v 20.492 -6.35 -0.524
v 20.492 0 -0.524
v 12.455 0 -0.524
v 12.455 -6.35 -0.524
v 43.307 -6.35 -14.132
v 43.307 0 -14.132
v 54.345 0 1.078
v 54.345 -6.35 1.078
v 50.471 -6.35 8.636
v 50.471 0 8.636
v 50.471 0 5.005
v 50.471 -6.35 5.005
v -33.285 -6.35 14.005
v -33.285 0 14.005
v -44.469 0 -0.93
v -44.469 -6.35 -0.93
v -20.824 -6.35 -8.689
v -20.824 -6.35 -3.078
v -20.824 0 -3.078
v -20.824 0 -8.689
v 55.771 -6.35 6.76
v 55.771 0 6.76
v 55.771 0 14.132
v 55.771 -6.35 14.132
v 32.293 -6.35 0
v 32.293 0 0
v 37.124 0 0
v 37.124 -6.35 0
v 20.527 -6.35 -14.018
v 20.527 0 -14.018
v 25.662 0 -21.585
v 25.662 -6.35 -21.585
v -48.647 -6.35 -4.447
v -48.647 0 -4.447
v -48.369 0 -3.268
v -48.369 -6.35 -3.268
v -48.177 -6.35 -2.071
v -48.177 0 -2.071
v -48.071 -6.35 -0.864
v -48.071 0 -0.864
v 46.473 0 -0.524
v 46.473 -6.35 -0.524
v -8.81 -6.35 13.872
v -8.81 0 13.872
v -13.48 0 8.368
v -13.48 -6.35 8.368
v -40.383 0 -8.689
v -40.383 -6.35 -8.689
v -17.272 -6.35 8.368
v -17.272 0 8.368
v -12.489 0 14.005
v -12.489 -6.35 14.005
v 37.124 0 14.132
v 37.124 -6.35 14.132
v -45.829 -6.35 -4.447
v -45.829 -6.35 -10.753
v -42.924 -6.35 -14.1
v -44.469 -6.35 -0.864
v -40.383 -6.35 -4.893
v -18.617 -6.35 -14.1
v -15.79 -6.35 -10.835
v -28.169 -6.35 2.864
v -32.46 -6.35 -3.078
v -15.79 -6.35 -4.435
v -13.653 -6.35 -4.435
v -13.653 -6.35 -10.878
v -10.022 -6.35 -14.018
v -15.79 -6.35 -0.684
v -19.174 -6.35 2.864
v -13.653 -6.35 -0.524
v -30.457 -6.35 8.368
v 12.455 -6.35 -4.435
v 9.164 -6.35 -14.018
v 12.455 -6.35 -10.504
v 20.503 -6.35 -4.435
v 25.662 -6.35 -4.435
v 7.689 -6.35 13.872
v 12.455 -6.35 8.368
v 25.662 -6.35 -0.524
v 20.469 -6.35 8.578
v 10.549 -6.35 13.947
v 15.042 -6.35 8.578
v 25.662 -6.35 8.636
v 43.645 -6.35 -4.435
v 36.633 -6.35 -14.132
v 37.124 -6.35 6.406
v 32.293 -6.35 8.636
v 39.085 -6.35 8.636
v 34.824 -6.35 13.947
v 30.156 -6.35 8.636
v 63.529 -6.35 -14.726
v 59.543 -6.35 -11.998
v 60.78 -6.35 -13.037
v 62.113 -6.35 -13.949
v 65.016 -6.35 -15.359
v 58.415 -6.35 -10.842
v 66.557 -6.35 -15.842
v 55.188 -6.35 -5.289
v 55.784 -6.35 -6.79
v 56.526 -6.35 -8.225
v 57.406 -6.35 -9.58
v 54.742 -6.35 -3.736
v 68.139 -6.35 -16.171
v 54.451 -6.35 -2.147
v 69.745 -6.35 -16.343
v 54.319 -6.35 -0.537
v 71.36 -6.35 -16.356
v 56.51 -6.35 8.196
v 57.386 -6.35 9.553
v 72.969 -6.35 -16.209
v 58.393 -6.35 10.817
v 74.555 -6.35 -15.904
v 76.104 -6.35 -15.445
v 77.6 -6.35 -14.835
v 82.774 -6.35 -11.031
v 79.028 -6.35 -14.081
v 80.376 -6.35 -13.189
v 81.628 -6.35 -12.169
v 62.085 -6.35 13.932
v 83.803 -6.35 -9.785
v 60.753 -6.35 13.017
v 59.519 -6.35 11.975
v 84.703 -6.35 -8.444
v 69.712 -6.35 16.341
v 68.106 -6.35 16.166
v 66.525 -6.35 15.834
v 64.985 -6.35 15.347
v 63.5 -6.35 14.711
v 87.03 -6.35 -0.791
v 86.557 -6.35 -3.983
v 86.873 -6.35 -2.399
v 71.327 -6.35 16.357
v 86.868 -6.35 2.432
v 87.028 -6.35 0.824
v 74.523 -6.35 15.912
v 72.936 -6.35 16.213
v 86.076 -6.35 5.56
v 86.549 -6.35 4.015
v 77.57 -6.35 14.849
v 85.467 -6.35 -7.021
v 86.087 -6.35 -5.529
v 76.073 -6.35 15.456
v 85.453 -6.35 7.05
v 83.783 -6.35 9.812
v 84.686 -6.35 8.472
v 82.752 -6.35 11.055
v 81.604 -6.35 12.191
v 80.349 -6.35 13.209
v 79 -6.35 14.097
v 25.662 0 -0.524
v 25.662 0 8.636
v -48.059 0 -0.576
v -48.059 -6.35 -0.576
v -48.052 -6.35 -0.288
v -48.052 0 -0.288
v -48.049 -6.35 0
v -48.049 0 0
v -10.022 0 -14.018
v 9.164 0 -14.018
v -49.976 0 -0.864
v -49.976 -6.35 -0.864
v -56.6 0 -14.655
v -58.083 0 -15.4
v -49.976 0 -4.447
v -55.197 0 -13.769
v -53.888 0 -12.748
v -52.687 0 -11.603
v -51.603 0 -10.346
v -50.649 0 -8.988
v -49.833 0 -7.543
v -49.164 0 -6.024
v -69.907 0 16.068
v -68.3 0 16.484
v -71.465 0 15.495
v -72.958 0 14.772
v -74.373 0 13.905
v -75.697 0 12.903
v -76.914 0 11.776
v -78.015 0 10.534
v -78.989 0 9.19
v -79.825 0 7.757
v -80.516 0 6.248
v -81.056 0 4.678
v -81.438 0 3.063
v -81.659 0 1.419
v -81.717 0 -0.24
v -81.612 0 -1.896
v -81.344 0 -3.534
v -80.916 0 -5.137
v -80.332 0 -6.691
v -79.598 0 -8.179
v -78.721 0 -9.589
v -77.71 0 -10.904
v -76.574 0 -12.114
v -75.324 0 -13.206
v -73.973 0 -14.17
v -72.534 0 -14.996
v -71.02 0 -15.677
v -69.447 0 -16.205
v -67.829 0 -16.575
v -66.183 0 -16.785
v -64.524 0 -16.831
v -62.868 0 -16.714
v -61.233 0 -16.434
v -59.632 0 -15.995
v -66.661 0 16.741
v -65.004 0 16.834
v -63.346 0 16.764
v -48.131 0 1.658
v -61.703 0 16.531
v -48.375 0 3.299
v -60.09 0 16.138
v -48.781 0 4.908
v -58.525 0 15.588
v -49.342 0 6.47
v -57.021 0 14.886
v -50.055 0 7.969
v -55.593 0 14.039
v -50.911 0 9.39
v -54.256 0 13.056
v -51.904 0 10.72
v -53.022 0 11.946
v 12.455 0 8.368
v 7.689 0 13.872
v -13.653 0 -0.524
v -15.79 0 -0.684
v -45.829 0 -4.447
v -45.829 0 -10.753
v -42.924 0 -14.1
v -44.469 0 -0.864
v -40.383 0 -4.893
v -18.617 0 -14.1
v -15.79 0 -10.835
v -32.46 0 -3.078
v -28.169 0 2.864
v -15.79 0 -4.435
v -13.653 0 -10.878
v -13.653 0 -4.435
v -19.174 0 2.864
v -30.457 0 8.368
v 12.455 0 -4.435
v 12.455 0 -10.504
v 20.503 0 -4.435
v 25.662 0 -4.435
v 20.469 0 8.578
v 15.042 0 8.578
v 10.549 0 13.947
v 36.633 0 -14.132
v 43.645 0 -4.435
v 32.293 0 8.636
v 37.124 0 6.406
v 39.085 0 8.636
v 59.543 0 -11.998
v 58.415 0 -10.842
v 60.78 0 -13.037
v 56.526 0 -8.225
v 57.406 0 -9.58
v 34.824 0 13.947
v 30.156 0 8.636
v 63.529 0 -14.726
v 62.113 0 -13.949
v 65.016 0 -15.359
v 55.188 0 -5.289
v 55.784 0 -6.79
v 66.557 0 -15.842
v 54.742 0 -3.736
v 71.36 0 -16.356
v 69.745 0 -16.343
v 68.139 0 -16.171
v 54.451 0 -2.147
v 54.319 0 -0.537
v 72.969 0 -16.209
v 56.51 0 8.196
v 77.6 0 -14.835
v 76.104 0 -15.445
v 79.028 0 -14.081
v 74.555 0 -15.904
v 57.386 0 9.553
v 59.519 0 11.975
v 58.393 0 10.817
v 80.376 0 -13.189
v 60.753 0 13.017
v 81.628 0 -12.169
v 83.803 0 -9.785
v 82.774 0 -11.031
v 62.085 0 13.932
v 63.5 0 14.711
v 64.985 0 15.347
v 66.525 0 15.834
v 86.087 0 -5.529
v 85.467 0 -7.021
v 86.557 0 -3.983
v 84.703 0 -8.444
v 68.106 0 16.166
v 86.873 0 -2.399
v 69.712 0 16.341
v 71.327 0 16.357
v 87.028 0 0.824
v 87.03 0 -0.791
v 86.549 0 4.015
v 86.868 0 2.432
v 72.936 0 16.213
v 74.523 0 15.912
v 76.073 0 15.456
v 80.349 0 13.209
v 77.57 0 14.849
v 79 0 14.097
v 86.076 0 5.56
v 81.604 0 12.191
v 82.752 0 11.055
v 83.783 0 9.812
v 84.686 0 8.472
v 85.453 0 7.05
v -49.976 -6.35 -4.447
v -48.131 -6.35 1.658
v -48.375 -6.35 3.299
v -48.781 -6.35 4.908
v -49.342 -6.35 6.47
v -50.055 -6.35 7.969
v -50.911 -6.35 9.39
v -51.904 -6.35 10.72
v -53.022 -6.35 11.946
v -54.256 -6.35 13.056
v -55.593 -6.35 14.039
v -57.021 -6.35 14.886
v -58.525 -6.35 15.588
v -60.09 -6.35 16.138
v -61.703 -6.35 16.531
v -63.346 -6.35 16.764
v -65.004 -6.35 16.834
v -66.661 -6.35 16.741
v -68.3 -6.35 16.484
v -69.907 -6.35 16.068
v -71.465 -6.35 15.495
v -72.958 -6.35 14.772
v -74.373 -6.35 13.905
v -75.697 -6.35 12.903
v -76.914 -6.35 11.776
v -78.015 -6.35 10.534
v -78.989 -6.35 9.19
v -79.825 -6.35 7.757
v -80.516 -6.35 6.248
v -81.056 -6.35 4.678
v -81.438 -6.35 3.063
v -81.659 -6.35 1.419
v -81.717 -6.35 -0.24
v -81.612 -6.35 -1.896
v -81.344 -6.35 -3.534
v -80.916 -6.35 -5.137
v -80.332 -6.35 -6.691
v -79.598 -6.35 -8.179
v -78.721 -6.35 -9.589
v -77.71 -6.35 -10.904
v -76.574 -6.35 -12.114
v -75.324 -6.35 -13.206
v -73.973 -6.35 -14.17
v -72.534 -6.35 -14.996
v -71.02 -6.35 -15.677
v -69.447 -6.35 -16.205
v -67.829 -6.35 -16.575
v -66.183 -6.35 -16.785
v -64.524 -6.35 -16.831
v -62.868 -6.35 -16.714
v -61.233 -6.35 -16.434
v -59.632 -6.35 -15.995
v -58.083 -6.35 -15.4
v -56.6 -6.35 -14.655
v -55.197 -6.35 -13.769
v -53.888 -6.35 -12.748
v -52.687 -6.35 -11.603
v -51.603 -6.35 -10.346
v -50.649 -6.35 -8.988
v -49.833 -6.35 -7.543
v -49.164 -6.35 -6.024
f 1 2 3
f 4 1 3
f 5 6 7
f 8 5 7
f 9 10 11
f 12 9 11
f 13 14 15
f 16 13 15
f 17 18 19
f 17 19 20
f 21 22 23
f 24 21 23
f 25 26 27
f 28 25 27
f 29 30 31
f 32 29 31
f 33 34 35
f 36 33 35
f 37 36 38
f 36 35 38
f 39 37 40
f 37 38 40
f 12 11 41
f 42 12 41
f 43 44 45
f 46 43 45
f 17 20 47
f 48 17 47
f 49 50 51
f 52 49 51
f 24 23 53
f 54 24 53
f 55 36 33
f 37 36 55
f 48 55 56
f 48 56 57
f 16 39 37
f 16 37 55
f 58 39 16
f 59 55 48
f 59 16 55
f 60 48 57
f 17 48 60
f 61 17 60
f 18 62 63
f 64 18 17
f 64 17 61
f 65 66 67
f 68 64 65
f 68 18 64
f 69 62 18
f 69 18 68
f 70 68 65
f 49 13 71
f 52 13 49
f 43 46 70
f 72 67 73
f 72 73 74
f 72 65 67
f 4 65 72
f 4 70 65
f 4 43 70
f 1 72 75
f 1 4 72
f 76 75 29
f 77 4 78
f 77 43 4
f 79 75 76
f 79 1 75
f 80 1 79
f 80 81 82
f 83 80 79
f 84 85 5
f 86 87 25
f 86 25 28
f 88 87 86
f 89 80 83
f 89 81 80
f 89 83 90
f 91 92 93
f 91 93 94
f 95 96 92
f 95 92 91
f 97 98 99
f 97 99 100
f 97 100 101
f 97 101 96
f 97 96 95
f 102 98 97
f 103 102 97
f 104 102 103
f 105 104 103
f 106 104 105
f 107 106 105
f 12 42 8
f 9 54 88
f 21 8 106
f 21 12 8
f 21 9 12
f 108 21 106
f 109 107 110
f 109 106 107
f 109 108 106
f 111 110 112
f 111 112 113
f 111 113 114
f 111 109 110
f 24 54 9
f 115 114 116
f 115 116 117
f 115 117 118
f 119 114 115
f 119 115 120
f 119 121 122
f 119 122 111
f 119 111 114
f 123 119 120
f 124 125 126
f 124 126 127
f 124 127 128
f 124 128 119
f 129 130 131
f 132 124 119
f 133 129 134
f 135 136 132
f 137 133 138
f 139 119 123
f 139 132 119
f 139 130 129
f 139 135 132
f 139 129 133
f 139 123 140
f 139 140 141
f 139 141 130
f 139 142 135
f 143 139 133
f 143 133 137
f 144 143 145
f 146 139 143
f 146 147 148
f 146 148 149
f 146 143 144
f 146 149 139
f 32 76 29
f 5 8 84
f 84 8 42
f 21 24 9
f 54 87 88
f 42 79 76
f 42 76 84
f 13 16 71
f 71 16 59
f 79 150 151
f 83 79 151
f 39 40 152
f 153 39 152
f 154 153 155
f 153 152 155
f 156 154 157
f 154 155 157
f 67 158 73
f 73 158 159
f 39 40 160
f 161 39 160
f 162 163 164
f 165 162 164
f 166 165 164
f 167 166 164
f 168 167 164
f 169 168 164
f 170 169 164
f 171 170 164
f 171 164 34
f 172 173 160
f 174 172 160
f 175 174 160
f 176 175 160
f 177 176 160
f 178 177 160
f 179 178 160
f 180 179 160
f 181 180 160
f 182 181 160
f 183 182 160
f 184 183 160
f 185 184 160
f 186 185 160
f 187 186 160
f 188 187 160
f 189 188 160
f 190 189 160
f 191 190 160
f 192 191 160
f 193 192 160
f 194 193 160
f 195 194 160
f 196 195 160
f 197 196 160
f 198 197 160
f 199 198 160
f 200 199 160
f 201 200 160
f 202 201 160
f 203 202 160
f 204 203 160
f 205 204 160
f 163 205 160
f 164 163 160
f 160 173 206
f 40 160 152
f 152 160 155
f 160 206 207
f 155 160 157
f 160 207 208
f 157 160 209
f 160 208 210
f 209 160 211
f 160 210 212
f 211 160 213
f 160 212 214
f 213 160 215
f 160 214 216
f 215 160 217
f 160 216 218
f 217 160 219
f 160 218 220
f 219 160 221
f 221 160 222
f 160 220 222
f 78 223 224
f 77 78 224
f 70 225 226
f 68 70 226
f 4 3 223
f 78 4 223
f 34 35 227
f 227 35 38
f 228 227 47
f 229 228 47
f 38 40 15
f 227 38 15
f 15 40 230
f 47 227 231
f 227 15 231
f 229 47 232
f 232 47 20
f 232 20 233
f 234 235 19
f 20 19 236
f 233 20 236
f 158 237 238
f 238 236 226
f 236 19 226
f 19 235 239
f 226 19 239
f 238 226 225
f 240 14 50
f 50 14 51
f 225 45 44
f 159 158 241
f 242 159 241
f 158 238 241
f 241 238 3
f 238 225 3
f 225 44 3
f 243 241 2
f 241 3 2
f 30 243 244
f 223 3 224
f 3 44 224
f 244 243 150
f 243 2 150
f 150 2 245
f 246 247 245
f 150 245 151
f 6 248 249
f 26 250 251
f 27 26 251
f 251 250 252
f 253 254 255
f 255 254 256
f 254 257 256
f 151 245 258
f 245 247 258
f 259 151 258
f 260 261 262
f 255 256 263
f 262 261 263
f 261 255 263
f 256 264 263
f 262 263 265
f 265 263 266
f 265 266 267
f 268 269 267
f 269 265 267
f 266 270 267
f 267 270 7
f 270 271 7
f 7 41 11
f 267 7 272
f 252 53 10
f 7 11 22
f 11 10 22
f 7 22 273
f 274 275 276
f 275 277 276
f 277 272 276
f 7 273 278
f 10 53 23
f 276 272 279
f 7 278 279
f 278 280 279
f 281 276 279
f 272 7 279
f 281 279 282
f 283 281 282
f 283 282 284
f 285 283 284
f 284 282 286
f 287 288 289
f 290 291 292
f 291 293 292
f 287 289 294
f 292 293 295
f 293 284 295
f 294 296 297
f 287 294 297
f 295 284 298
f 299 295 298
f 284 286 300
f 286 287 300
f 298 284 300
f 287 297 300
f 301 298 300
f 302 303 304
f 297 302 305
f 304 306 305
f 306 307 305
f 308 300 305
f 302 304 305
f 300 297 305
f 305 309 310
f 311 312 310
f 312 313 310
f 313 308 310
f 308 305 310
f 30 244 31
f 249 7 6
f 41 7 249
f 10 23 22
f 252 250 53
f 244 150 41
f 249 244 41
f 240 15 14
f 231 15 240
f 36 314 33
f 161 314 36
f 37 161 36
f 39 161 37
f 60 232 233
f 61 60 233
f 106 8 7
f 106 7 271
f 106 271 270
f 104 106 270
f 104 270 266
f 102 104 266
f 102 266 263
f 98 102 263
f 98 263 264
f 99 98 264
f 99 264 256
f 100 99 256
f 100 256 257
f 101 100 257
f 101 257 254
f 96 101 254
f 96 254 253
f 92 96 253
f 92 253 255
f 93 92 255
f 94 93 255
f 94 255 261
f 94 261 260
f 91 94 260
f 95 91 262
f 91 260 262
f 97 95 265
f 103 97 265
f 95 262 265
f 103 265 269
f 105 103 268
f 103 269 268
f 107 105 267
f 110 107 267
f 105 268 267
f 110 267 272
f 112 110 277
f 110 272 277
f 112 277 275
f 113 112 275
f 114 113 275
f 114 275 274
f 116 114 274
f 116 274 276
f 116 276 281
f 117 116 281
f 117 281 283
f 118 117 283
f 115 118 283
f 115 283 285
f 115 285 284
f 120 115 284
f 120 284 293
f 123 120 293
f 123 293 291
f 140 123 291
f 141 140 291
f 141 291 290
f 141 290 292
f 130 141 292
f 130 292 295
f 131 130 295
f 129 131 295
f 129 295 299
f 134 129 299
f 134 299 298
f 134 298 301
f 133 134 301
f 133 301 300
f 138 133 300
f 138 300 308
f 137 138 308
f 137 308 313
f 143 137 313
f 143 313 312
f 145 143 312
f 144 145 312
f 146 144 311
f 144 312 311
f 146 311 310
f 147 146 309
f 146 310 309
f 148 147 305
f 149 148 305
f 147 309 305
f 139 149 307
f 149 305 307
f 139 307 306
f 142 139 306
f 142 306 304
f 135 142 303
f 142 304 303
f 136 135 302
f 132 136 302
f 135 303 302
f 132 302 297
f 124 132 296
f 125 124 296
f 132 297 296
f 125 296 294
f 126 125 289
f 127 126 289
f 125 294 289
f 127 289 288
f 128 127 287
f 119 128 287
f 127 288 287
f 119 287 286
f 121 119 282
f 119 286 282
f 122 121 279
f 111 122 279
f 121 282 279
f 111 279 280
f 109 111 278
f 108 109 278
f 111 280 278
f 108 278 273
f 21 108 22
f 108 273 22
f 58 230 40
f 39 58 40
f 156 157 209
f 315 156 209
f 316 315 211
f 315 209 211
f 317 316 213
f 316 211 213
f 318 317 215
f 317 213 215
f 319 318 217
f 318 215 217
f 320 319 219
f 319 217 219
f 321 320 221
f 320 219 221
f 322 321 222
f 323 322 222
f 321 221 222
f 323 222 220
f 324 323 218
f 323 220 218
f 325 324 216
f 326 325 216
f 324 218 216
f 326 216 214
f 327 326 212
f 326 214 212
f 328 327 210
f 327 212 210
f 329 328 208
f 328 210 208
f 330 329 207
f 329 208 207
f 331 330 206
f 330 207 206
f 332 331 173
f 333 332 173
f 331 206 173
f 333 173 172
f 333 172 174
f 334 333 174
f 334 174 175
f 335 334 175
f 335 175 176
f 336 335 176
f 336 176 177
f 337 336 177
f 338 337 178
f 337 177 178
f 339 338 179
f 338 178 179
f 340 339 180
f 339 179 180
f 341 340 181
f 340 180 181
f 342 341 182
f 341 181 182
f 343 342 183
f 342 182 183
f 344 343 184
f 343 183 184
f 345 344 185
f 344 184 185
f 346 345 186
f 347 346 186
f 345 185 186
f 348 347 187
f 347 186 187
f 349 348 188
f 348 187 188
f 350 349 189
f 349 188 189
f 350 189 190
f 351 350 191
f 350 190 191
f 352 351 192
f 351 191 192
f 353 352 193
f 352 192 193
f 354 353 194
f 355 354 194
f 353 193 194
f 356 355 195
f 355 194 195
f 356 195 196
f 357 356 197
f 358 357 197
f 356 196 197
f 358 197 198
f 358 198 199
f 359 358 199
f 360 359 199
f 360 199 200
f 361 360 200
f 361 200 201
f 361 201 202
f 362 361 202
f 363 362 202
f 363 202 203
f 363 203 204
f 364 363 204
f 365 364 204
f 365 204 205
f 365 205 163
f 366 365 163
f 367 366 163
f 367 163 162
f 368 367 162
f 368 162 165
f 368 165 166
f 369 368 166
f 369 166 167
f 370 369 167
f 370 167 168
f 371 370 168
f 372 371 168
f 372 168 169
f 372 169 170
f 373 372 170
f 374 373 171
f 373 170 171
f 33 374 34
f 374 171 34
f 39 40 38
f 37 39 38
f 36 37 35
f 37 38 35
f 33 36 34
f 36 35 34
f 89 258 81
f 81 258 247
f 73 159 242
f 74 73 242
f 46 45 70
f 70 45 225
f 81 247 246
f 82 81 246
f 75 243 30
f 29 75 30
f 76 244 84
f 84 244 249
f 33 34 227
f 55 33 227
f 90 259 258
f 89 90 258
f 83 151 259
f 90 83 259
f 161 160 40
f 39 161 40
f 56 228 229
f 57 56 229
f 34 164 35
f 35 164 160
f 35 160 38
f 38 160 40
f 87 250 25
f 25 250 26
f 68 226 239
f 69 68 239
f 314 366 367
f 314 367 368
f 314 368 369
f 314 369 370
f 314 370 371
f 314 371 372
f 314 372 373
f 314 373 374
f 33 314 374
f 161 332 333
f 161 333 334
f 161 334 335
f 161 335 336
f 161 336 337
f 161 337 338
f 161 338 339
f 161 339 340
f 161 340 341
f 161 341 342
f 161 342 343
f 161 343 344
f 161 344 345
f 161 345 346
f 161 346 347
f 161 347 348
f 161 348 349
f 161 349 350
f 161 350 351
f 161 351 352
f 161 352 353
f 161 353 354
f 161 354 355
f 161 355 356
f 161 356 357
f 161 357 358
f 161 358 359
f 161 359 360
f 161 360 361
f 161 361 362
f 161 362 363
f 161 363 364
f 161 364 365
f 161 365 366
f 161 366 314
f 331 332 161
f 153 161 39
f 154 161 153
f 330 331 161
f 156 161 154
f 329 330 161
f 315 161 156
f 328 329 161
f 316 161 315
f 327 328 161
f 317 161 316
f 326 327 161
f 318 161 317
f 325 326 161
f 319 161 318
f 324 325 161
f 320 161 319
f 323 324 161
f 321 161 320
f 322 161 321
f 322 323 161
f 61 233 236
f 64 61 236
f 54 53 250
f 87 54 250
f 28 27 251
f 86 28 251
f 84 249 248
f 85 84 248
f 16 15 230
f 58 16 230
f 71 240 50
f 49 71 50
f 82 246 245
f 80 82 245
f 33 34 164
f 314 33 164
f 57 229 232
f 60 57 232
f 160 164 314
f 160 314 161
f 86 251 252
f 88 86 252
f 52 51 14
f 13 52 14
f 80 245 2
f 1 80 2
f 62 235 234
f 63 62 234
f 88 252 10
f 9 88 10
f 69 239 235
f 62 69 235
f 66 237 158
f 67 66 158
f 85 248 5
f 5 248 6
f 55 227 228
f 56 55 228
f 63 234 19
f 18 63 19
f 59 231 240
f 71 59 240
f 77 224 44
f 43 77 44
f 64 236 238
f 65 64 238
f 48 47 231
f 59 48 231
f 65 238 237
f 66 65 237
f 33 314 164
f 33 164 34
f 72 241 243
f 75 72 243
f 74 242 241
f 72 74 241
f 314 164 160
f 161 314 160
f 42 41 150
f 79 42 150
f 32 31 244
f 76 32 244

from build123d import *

# Parameters (mm, degrees)
F0_W     = 26.1089192261
F0_H     = 3.9108566001
F1_DEPTH = 6.35
F3_DEPTH = 6.35
F2_R     = 16.3697658046
F2_W     = 1.3287387717
F2_H     = 3.5829652334
F4_DEPTH = 6.35


with BuildPart() as f1:
    # F0 (on Front) → F1 (new body)
    with BuildSketch(Plane.XZ):
        Polygon((-17.2716648454, 8.3683752126), (-12.4890261563, 14.0050568812), (-33.2854723321, 14.0050568812), (-45.8293622946, -2.7476381483), (-45.8293622946, -10.7526200239), (-42.924048809, -14.0997227066), (-18.6173166222, -14.0997227066), (-15.7900494681, -10.8351450901), (-15.7900494681, -4.4349345413), (-15.7900494681, -0.6844981479), (-19.1735985349, 2.8641023428), (-28.1688865431, 2.8641023428), (-32.4602175373, -3.0777403073), (-20.8241108796, -3.0777403073), (-20.8241108796, -8.689479593), (-40.3826734857, -8.689479593), (-40.3826734857, -4.8933031288), (-30.4567566351, 8.3683752126), align=None)
        Polygon((-15.7900494681, -0.6844981479), (-15.7900494681, -4.4349345413), (-13.6534879907, -4.4349345413), (-13.6534879907, -0.5240779412), align=None)
        Polygon((-13.4795079801, 8.3683752126), (-13.6534879907, -0.5240779412), (12.4554312354, -0.5240779412), (12.4554312354, 8.3683752126), (7.6892861493, 13.8719277541), (-8.8098273311, 13.8719277541), align=None)
        Polygon((12.4554312354, -4.4349345413), (-13.6534879907, -4.4349345413), (-13.6534879907, -10.8778495407), (-10.0223072469, -14.0183292718), (9.1640663944, -14.0183292718), (12.4554312354, -10.5037926609), align=None)
        with Locations((-0.5990283776, -2.4795062412)):
            Rectangle(F0_W, F0_H)
        Polygon((12.4554312354, -0.5240779412), (12.4554312354, -4.4349345413), (20.5025033344, -4.4349345413), (20.4924039301, -0.5240779412), align=None)
        Polygon((20.4924039301, -0.5240779412), (20.5025033344, -4.4349345413), (25.6624393119, -4.4349345413), (25.6624393119, -0.5240779412), align=None)
        Polygon((25.6624393119, -4.4349345413), (20.5025033344, -4.4349345413), (20.5272515133, -14.0183292718), (25.6624393119, -21.5849358625), align=None)
        Polygon((20.4688984527, 8.5780975808), (20.4924039301, -0.5240779412), (25.6624393119, -0.5240779412), (25.6624393119, 8.6364520189), (30.1557282913, 8.6364520189), (34.824080585, 13.9467024431), (10.5486494841, 13.9467024431), (15.0419384635, 8.5780975808), align=None)
        Polygon((25.6624393119, -0.5240779412), (25.6624393119, -4.4349345413), (43.6452688808, -4.4349345413), (46.4731191558, -0.5240779412), align=None)
        Polygon((46.4731191558, -0.5240779412), (43.6452688808, -4.4349345413), (36.63333265, -14.1322927537), (43.3068559529, -14.1322927537), (55.7706377054, 3.0422103174), (55.7706377054, 14.1320324027), (37.1240322851, 14.1320324027), (32.2927525449, 8.6364520189), (32.2927525449, 0), (37.1240322851, 0), (37.1240322851, 6.4059590582), (39.0849053321, 8.6364520189), (50.4710761359, 8.6364520189), (50.4710761359, 5.0050112685), align=None)
    extrude(amount=F1_DEPTH)



with BuildPart() as f3:
    # F2 (on Front) → F3 (new body)
    with BuildSketch(Plane.XZ):
        with BuildLine():
            ThreePointArc((-48.0712823183, -0.8643780602), (-48.0546292637, -0.4323316164), (-48.0490770247, 0))
            ThreePointArc((-48.0490770247, 0), (-81.5684530665, 2.2436879547), (-48.6471407187, -4.4473432936))
            Line((-48.6471407187, -4.4473432936), (-49.9758794904, -4.4473432936))
            Line((-49.9758794904, -4.4473432936), (-49.9758794904, -0.8643780602))
            Line((-49.9758794904, -0.8643780602), (-48.6471407187, -0.8643780602))
            Line((-48.6471407187, -0.8643780602), (-48.0712823183, -0.8643780602))
        make_face()
    extrude(amount=F3_DEPTH)


with BuildPart() as f1_1:
    add(f1.part)

    add(f3.part)  # F3#2 merges F3
    # F2 (on Front) → F3, piece 2 (join)
    with BuildSketch(Plane.XZ):
        with BuildLine():
            ThreePointArc((-48.0712823183, -0.8643780602), (-48.2623854024, -2.6714226845), (-48.6471407187, -4.4473432936))
            Line((-48.6471407187, -4.4473432936), (-44.4687306881, -4.4473432936))
            Line((-44.4687306881, -4.4473432936), (-44.4687306881, -0.8643780602))
            Line((-44.4687306881, -0.8643780602), (-48.0712823183, -0.8643780602))
        make_face()
        with Locations((70.6794634461, 0)):
            Circle(F2_R)
    extrude(amount=F3_DEPTH)


with BuildPart() as f4:
    # F2 (on Front) → F4 (new body)
    with BuildSketch(Plane.XZ):
        with Locations((-49.3115101045, -2.6558606769)):
            Rectangle(F2_W, F2_H)
        with BuildLine():
            Line((-48.6471407187, -0.8643780602), (-48.6471407187, -4.4473432936))
            ThreePointArc((-48.6471407187, -4.4473432936), (-48.2623854024, -2.6714226845), (-48.0712823183, -0.8643780602))
            Line((-48.0712823183, -0.8643780602), (-48.6471407187, -0.8643780602))
        make_face()
    extrude(amount=F4_DEPTH)


solid = Compound([f1_1.part, f4.part])
